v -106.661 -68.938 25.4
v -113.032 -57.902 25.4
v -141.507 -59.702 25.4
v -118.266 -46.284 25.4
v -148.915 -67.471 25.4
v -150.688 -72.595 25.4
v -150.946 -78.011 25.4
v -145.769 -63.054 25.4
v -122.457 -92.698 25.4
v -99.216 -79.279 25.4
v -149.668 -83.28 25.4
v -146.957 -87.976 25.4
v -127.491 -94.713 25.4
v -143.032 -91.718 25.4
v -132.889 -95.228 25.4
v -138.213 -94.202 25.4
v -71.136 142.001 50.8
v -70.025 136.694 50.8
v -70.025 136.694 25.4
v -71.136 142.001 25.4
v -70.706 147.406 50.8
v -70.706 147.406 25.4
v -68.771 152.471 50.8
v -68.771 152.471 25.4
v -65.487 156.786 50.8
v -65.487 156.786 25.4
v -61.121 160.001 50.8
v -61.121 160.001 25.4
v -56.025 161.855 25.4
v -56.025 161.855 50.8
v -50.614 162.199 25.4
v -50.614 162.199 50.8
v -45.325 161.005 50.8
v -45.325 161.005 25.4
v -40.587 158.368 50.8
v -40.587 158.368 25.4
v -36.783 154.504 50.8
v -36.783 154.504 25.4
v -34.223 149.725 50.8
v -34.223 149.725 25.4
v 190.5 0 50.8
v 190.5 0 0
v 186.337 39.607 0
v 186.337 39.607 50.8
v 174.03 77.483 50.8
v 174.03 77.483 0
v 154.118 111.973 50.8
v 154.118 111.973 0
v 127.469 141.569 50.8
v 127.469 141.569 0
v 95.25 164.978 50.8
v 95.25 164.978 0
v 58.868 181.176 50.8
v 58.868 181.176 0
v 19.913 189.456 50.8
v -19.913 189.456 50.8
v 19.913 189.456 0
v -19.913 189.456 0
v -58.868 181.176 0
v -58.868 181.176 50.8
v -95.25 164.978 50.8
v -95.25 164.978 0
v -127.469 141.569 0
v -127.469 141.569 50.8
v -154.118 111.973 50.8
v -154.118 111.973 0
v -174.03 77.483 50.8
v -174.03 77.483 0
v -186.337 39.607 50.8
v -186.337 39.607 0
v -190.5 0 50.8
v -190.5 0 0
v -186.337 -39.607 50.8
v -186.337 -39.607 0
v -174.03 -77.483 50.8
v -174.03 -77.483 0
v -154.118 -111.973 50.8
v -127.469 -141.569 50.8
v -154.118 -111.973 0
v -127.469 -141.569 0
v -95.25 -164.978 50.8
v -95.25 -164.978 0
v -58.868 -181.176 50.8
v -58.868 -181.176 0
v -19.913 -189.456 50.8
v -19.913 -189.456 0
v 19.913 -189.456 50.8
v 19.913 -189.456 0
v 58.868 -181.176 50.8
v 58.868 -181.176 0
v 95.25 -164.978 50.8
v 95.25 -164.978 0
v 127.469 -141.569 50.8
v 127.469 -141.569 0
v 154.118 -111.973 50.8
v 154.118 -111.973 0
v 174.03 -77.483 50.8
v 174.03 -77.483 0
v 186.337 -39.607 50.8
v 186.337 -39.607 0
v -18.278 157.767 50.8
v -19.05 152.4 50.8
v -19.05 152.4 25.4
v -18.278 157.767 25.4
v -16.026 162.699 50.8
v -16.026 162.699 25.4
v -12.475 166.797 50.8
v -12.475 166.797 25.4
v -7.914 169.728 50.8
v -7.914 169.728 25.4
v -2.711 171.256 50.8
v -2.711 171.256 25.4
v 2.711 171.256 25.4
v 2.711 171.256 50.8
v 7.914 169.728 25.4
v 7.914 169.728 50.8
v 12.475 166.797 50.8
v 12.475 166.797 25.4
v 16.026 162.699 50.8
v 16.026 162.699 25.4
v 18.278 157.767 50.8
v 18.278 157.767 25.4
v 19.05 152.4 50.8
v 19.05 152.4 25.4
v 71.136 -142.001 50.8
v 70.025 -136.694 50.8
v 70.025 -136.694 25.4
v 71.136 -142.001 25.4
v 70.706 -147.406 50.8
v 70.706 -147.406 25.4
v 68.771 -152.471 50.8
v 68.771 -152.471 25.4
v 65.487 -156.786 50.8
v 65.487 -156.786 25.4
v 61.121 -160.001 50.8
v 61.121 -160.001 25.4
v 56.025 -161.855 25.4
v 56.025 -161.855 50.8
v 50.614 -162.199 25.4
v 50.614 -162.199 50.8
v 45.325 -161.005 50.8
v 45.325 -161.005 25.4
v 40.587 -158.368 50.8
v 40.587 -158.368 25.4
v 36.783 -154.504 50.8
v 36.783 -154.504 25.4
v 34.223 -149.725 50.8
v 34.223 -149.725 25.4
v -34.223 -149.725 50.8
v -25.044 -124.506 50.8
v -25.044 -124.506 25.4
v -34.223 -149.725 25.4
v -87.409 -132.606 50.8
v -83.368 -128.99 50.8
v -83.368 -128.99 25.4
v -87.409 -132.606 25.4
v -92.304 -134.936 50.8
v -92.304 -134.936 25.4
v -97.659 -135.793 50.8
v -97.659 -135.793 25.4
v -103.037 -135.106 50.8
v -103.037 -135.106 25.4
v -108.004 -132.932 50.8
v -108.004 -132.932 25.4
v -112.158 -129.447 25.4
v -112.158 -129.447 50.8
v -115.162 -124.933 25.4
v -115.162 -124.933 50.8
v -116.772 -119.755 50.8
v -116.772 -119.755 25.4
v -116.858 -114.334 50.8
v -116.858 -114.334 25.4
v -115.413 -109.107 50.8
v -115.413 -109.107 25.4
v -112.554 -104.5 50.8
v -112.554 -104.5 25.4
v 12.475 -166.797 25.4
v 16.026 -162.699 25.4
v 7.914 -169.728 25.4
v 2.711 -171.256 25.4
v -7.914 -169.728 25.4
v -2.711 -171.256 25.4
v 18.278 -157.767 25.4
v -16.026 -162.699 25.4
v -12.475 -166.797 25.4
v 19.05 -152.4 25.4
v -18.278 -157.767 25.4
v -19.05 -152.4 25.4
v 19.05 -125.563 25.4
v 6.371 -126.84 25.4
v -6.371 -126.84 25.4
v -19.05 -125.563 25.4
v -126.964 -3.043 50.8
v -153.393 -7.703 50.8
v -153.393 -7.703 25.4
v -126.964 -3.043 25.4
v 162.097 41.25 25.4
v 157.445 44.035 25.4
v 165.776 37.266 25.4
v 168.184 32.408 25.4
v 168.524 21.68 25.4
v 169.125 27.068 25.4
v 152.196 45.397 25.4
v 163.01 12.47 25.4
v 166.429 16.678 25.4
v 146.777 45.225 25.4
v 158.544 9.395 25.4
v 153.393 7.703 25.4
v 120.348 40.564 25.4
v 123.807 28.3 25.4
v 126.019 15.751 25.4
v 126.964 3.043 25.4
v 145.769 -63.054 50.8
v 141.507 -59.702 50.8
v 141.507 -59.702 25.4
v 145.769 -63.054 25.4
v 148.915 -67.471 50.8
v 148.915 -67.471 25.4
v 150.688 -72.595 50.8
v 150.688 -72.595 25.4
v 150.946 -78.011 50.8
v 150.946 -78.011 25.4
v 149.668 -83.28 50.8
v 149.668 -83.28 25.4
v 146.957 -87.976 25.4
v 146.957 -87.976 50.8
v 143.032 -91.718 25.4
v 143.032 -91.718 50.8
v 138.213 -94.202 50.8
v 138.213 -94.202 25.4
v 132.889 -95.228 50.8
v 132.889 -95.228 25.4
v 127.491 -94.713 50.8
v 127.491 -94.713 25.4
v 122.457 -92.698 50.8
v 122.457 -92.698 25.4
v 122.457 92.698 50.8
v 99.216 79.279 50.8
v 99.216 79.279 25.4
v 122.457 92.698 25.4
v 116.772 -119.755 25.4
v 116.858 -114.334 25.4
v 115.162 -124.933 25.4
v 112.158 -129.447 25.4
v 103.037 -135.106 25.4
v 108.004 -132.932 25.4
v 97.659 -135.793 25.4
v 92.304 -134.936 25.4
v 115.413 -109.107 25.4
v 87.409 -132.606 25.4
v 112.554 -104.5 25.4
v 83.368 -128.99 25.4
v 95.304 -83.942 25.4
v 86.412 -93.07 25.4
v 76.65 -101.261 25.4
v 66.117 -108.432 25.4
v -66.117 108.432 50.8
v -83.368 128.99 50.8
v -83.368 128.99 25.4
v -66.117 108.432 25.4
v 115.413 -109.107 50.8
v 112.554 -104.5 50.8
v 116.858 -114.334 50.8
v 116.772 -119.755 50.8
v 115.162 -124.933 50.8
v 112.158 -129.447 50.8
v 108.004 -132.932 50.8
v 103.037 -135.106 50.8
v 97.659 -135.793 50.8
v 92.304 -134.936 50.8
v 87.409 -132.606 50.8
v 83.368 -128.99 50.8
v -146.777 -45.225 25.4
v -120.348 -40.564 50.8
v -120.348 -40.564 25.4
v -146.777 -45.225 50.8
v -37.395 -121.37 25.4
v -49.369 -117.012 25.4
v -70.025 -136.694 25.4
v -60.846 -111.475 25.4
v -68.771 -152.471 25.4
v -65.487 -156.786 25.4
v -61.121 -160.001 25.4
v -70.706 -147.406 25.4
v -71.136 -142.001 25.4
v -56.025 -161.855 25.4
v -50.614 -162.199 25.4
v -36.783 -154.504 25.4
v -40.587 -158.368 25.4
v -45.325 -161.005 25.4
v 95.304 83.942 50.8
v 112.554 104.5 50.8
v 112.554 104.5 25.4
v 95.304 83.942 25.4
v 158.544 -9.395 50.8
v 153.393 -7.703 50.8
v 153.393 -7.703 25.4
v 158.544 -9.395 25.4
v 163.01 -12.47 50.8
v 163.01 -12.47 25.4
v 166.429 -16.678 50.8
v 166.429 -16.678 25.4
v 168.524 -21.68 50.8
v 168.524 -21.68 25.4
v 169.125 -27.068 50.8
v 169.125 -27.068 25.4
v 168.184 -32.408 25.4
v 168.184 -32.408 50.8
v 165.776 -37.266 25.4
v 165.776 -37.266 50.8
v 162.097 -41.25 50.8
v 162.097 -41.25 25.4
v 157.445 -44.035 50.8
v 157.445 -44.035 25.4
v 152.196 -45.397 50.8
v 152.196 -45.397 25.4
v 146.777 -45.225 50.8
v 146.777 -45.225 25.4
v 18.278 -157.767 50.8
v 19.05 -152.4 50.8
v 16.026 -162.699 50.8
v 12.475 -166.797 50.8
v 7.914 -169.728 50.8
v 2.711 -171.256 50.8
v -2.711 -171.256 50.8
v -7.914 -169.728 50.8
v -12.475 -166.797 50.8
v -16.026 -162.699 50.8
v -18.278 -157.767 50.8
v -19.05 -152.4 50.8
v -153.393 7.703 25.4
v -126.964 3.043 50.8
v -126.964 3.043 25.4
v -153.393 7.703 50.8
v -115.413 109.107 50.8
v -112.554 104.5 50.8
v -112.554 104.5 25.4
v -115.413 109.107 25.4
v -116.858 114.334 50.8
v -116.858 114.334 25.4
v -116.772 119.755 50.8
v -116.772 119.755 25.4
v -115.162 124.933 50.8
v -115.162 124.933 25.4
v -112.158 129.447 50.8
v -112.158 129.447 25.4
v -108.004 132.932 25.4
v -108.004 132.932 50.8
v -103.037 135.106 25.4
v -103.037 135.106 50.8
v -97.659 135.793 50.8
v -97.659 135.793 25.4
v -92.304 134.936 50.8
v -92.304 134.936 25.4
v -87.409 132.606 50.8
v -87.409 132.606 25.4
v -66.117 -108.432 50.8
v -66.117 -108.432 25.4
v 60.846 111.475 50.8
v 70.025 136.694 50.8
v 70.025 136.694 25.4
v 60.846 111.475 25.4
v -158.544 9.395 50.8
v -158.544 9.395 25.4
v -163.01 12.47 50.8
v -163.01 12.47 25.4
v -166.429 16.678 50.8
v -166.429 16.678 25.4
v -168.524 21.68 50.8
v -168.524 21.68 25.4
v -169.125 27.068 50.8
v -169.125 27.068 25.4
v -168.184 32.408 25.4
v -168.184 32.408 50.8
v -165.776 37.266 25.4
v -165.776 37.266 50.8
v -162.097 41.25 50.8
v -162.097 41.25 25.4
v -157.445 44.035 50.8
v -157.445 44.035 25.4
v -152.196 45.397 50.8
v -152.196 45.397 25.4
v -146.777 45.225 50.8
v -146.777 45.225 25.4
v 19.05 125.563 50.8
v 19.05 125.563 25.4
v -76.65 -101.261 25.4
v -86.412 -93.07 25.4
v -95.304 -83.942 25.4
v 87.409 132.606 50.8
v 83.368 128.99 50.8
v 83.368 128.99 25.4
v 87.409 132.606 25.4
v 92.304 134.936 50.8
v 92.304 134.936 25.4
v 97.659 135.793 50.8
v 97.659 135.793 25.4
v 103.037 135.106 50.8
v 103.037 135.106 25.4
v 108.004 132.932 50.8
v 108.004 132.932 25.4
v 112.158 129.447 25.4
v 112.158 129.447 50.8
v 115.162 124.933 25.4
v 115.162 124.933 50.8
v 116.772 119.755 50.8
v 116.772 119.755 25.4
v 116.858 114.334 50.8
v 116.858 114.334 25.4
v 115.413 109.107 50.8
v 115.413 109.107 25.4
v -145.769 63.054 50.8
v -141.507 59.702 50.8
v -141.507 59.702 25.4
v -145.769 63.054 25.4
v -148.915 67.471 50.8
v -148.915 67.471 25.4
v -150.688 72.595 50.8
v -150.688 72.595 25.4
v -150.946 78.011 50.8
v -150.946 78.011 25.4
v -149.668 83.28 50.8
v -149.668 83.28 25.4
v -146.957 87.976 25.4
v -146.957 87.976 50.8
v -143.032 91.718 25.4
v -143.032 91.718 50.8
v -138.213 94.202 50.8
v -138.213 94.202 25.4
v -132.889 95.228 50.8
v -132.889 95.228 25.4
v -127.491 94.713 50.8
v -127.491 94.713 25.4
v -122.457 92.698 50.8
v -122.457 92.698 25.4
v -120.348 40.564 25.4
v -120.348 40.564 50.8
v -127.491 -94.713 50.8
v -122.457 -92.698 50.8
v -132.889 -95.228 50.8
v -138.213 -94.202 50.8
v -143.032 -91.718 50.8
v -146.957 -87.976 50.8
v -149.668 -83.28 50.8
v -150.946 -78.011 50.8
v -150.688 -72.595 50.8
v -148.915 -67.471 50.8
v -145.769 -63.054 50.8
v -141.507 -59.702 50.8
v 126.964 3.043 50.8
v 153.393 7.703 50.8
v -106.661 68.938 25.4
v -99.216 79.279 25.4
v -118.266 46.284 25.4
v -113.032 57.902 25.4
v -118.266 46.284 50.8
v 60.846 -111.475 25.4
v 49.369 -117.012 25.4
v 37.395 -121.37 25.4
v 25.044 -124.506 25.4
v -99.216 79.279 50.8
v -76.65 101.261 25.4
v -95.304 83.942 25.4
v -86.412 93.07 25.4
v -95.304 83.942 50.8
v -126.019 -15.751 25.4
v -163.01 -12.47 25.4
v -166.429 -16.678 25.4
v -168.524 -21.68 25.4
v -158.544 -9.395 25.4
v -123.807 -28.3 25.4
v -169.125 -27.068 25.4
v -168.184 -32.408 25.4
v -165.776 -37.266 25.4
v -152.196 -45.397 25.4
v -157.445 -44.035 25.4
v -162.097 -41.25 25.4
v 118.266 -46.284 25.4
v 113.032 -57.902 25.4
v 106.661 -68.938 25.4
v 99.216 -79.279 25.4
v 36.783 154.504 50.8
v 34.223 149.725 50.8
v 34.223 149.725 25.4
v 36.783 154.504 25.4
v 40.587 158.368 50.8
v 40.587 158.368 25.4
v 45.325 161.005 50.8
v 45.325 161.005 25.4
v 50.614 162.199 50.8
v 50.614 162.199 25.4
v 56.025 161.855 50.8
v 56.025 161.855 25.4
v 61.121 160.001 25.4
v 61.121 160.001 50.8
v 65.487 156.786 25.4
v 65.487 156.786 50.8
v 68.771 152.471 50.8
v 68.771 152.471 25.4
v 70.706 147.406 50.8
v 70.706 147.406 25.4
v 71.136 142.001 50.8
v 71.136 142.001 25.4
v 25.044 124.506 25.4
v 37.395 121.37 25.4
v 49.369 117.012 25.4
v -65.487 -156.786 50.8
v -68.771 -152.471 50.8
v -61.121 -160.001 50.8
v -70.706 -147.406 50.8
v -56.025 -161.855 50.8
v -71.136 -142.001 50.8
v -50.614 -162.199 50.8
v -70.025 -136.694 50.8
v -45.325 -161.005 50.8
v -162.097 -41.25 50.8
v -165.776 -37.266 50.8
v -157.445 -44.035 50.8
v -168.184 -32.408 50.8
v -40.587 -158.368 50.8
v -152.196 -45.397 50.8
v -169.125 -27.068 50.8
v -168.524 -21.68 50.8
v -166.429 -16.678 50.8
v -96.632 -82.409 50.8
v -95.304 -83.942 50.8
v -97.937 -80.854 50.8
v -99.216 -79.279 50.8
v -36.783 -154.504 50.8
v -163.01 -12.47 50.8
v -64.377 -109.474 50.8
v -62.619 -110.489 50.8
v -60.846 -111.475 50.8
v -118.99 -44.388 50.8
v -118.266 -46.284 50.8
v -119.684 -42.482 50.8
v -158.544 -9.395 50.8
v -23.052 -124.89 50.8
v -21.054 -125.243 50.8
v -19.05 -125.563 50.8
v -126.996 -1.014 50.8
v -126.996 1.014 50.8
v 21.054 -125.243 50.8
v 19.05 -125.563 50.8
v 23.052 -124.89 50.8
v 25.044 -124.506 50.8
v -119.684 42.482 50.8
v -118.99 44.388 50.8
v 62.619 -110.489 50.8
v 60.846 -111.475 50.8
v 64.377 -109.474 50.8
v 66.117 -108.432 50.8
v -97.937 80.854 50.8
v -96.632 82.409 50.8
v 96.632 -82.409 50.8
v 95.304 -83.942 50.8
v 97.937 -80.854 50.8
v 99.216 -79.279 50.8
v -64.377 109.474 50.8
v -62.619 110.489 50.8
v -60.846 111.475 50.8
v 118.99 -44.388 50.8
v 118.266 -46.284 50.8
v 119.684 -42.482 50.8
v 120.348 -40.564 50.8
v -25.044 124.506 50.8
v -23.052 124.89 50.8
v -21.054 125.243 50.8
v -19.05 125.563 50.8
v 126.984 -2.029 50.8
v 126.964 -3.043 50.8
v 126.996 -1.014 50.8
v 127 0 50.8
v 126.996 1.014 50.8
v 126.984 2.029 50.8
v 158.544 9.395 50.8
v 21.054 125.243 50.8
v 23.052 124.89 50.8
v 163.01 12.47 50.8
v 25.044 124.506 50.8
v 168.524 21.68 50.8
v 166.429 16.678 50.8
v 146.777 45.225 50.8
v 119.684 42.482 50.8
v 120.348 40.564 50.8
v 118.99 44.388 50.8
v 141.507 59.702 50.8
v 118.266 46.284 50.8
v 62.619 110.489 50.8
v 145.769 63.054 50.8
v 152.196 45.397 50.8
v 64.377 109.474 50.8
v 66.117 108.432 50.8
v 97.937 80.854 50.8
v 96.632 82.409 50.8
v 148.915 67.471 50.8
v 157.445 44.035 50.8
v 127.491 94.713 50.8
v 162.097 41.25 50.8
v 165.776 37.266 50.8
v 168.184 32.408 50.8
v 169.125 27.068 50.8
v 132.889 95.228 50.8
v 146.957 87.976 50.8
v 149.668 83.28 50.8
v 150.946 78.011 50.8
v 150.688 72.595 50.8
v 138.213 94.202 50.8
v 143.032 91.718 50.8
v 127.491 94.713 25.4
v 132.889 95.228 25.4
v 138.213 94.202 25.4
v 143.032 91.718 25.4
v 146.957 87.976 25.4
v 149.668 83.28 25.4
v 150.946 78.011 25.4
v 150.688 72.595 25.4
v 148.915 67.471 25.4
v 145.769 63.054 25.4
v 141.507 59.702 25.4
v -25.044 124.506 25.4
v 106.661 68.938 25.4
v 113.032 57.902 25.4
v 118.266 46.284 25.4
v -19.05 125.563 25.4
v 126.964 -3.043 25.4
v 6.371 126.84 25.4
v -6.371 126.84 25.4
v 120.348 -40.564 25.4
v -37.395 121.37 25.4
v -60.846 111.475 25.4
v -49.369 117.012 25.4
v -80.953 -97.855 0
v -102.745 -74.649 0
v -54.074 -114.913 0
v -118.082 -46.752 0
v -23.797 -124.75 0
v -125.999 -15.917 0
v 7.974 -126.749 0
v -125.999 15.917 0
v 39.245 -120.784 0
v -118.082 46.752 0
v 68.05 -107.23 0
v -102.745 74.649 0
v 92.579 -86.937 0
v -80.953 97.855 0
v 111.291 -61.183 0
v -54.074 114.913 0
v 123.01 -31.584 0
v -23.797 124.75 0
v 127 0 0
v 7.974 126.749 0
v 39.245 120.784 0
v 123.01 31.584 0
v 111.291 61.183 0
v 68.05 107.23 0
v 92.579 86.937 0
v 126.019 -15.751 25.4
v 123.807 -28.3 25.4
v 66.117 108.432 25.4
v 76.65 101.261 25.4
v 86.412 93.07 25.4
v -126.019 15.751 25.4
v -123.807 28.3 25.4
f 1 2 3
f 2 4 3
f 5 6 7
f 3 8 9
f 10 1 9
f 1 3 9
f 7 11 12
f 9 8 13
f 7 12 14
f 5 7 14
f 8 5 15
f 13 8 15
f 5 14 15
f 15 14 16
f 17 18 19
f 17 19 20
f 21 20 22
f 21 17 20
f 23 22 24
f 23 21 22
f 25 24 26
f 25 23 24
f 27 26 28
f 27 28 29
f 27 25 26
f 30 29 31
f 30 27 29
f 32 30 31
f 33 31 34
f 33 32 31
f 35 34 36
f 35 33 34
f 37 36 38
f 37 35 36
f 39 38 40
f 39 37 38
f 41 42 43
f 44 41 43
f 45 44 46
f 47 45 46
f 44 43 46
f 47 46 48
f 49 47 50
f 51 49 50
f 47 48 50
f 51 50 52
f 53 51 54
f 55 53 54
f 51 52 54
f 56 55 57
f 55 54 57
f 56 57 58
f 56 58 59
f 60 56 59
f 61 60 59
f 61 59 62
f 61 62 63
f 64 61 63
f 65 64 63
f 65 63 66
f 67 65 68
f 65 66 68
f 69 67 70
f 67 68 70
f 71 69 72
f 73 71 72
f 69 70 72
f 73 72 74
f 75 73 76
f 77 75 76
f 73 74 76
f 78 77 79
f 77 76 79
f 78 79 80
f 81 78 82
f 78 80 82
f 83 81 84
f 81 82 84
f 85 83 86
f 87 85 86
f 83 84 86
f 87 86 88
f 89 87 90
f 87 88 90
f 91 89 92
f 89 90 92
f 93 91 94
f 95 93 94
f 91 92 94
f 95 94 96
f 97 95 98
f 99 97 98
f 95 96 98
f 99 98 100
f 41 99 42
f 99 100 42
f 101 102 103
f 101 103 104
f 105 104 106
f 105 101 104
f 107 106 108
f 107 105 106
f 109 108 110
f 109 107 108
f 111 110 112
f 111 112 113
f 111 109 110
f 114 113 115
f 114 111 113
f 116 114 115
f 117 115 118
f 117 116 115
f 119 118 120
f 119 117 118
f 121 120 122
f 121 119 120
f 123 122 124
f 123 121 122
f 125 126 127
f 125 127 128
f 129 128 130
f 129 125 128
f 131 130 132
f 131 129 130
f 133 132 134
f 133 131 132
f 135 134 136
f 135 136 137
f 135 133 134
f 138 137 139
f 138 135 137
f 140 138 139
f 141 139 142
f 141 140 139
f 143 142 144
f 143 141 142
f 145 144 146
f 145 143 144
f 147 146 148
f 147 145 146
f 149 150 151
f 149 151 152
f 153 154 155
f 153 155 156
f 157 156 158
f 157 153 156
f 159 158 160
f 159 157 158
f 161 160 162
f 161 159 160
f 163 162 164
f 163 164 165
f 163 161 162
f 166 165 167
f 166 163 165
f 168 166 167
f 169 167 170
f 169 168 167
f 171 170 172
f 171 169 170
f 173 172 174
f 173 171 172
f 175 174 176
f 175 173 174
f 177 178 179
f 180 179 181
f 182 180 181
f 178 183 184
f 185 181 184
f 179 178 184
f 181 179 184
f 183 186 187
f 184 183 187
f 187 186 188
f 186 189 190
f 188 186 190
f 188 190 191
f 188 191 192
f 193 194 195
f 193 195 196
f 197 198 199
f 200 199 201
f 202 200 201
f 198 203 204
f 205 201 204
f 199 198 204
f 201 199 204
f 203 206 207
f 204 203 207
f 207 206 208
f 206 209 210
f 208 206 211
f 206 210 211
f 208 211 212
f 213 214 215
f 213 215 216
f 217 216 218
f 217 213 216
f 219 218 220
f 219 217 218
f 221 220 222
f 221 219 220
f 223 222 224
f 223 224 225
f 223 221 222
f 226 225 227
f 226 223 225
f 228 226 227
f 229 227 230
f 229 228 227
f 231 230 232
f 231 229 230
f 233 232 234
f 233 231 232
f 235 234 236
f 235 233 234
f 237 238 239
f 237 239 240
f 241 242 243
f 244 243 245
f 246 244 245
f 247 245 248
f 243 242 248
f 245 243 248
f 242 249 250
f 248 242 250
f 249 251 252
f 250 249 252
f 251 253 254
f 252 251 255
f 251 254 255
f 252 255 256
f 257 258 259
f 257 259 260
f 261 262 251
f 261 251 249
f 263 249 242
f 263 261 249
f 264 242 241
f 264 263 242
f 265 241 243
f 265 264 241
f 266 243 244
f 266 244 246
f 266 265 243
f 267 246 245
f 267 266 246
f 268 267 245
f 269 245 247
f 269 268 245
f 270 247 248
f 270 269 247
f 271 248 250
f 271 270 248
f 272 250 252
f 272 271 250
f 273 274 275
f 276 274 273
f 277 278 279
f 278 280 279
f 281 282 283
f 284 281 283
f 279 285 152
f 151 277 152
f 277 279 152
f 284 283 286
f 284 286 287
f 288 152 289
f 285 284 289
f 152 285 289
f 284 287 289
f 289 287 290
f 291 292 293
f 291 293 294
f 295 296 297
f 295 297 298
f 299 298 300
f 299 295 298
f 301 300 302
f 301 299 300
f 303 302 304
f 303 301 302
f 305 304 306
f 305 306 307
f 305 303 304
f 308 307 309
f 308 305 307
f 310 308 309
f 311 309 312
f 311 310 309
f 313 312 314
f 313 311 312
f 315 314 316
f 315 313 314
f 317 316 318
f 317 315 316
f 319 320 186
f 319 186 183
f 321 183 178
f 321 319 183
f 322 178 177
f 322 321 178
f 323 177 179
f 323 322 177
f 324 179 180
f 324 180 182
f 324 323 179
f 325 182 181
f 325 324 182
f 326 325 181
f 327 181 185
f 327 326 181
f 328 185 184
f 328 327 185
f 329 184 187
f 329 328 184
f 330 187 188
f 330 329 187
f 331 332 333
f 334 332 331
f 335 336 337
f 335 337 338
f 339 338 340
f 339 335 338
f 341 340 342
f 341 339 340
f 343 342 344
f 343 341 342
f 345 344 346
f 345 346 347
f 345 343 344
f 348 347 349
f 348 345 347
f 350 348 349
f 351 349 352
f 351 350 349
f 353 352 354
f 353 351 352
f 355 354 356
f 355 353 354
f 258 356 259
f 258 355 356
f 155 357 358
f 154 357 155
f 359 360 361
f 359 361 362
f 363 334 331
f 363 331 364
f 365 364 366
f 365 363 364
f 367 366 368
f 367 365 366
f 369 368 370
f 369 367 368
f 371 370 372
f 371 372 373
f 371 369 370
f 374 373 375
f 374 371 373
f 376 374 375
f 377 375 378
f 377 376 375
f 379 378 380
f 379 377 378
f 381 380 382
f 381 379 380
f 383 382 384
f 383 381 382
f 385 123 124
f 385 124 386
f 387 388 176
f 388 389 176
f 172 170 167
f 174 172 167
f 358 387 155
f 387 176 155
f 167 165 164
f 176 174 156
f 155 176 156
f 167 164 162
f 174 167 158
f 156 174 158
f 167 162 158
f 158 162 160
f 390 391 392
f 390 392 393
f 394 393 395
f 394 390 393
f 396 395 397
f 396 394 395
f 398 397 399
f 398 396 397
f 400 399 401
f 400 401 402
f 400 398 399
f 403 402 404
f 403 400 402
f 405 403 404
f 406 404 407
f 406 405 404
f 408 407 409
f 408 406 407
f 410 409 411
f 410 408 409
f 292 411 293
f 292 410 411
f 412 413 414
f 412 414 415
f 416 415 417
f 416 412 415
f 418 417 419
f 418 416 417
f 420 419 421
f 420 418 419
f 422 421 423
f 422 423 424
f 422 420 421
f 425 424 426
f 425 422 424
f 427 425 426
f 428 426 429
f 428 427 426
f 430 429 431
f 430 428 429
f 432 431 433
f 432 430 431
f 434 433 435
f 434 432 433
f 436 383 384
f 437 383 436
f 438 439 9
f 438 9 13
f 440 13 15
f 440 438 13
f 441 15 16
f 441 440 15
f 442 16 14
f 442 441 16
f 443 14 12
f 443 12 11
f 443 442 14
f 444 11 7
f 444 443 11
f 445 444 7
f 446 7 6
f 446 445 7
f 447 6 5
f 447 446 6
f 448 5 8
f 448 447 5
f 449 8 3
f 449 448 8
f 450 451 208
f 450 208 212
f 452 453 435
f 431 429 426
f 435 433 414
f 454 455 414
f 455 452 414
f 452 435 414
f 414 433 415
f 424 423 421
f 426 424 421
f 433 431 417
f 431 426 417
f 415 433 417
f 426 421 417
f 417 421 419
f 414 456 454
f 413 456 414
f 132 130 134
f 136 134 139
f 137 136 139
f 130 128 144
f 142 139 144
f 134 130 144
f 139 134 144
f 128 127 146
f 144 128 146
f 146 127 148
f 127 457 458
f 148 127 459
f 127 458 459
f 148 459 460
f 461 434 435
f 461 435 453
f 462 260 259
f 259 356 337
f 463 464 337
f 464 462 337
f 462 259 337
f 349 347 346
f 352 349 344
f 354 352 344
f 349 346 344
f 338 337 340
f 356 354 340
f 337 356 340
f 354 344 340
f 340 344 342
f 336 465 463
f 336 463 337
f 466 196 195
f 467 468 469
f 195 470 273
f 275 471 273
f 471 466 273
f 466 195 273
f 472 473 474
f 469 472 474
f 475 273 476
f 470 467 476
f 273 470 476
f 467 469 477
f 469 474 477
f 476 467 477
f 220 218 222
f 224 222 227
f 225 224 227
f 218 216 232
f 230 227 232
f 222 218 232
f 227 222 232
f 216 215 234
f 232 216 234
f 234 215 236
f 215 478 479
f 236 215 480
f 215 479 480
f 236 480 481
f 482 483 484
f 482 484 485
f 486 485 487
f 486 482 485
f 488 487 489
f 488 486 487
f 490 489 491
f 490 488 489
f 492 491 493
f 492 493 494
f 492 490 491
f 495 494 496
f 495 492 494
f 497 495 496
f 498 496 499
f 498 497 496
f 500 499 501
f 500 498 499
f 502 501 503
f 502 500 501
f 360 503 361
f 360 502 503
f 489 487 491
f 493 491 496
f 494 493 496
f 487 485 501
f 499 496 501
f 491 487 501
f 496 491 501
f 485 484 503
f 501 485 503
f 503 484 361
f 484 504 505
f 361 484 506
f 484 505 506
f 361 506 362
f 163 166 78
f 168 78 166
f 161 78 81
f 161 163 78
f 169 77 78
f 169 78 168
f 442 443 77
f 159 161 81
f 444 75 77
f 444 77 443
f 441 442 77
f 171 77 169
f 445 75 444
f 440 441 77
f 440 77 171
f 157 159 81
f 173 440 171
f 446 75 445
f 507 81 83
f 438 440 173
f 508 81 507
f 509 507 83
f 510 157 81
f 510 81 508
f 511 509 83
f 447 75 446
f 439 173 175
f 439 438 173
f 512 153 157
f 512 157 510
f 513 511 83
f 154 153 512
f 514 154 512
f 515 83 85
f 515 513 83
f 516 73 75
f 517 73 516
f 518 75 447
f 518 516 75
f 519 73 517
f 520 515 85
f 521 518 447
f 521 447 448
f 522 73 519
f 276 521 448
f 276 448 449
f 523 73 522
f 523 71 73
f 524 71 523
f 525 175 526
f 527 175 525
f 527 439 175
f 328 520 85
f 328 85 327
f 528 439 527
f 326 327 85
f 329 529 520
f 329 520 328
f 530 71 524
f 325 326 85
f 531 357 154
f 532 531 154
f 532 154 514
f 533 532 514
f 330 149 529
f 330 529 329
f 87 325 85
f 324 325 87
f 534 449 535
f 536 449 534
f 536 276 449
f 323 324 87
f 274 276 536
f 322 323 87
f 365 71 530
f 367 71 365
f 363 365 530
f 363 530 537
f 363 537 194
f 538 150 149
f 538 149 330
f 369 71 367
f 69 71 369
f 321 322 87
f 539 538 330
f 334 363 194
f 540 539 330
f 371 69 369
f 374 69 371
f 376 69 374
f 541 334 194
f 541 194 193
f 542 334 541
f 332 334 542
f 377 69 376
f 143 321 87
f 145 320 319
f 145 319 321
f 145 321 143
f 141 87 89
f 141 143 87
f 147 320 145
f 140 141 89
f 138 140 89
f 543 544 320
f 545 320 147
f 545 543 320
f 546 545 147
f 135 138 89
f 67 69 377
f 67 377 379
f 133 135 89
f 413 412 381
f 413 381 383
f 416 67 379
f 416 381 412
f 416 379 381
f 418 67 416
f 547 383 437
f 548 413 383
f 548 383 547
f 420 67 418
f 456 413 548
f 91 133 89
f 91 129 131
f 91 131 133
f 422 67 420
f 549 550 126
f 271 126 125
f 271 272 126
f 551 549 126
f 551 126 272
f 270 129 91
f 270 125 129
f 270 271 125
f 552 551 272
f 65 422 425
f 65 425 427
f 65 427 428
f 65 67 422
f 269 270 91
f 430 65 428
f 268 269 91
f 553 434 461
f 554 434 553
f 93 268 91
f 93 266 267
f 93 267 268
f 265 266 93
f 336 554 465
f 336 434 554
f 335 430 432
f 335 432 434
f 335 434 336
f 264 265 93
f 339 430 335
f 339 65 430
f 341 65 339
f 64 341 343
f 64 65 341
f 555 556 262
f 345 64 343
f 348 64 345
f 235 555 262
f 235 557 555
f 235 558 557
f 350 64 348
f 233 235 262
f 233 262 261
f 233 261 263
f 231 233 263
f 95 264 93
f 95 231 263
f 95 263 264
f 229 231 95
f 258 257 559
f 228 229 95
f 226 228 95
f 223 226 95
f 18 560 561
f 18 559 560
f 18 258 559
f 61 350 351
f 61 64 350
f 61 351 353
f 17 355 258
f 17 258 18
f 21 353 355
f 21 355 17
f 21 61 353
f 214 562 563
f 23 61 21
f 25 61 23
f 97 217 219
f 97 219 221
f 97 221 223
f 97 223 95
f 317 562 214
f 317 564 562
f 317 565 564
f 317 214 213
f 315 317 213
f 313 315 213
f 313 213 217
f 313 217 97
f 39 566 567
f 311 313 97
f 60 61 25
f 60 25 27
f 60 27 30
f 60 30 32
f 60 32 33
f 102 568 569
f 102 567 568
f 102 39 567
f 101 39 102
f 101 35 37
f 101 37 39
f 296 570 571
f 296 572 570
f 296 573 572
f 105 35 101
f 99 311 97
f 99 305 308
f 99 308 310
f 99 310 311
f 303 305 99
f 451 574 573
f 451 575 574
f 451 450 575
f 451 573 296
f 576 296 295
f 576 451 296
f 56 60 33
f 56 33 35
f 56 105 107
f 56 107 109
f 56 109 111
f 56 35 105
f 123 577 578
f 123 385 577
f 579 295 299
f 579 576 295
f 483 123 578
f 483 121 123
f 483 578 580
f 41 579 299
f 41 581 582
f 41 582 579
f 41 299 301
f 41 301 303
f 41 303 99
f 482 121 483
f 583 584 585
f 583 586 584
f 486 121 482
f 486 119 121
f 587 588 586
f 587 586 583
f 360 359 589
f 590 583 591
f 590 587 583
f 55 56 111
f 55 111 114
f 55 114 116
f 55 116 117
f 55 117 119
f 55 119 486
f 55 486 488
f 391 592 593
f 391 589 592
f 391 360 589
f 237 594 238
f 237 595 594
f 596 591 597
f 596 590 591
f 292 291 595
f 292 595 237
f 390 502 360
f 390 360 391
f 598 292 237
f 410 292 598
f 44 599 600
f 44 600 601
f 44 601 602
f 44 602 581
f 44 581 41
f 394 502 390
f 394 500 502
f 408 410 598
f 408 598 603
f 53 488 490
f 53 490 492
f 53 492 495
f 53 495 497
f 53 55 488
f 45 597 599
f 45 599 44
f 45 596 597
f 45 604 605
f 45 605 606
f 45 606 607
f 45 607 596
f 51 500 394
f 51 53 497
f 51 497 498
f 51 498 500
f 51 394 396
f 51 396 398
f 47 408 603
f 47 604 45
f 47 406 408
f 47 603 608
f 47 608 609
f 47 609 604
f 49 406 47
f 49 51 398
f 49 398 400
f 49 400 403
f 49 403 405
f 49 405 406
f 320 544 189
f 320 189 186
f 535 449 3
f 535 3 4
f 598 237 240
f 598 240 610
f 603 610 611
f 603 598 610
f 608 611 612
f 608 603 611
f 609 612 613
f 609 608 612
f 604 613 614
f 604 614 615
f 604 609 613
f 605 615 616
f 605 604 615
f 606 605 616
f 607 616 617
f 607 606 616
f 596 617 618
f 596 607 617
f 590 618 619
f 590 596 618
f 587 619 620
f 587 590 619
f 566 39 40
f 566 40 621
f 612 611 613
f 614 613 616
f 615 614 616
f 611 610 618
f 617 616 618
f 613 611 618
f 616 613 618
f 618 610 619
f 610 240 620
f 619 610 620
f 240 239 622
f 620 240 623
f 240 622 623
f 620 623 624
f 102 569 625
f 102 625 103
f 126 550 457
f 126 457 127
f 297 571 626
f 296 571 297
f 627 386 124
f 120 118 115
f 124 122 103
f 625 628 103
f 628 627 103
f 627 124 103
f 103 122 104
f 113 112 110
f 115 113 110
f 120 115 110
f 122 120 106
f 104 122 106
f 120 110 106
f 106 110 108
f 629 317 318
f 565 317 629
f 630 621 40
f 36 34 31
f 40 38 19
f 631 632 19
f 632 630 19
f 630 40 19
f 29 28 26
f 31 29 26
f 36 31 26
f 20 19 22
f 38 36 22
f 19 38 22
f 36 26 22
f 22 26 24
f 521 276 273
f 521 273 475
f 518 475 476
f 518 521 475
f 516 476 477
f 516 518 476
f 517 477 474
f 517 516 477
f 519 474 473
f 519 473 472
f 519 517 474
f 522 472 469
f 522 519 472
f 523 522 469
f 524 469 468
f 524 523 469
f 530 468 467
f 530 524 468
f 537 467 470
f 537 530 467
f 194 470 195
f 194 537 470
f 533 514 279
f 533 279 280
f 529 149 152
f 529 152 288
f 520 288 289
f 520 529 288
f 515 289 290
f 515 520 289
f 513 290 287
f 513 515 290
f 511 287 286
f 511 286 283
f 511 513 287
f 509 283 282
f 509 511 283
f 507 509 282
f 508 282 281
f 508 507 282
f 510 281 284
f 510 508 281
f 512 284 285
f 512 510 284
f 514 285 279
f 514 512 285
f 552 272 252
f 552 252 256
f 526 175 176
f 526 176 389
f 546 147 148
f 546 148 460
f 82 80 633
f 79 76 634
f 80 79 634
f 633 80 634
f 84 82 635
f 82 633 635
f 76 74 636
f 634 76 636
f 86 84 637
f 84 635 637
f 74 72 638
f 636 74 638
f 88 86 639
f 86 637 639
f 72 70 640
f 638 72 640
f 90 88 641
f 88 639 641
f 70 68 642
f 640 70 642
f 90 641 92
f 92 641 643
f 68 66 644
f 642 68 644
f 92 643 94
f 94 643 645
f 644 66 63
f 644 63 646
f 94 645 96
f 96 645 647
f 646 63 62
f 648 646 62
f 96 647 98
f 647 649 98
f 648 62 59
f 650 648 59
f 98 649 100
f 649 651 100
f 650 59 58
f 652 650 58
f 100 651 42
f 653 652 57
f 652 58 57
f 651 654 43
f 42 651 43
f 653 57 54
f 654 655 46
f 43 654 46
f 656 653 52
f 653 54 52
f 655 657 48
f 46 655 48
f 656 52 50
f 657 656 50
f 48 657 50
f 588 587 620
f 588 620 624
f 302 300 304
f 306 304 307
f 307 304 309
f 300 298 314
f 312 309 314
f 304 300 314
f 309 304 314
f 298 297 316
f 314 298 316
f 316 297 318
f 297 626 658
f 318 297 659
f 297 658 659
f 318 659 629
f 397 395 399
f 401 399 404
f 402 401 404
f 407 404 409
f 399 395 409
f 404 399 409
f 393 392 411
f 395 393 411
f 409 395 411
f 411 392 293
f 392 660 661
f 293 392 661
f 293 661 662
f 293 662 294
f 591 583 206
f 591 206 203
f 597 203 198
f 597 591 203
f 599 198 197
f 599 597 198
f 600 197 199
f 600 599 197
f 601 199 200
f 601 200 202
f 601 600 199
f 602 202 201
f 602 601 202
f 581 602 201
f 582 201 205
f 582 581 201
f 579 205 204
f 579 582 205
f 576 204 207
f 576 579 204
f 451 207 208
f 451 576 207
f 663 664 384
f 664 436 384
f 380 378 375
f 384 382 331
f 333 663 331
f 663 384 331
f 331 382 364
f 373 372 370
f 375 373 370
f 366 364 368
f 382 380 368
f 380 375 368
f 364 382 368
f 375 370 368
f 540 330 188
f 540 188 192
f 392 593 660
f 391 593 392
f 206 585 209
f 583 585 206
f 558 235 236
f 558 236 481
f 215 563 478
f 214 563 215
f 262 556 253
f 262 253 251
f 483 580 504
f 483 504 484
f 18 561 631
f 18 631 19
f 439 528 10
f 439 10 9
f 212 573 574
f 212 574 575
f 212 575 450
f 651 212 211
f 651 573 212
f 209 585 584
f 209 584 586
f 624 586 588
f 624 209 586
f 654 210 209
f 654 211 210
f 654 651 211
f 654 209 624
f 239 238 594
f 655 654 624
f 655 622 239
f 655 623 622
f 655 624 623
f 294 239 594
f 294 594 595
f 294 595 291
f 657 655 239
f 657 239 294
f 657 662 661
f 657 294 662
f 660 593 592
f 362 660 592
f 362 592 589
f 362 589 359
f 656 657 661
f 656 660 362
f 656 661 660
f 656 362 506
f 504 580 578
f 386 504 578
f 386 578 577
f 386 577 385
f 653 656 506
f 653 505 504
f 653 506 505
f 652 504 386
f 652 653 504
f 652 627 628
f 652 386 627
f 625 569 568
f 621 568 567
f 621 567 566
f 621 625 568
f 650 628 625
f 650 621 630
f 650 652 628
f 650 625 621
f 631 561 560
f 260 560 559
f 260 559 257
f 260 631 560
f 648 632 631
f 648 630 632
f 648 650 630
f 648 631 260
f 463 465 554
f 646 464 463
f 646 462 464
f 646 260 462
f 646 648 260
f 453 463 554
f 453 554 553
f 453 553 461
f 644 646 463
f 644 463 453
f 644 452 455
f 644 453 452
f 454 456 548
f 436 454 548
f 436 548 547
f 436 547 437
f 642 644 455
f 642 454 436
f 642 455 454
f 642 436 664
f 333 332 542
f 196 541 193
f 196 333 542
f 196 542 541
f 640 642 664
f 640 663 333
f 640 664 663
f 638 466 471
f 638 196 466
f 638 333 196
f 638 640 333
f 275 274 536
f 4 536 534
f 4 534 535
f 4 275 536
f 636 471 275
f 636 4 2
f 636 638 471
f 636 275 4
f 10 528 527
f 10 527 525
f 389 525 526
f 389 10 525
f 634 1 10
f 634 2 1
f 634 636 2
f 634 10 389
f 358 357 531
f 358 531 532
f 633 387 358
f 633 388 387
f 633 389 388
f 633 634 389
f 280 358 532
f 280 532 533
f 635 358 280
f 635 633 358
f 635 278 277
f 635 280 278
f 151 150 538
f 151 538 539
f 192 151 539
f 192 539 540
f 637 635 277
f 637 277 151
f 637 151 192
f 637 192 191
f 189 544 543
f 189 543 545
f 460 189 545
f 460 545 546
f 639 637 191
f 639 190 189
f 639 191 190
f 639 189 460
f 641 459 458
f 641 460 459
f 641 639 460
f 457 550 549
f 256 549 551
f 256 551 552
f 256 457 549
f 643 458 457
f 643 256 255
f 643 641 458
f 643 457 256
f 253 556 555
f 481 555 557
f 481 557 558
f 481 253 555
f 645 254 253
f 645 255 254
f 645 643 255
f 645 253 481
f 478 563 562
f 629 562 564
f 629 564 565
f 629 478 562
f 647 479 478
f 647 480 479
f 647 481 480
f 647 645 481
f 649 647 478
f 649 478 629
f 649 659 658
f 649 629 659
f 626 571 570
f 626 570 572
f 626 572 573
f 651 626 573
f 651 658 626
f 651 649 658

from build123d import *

# Parameters (mm, degrees)
SKETCH1_R           = 190.5
SKETCH1_R_2         = 127
BOSS_EXTRUDE1_DEPTH = 50.8
CUT_EXTRUDE1_DEPTH  = 25.4
CIRPATTERN1_COUNT   = 10
CIRPATTERN1_ANGLE   = 180


with BuildPart() as part:
    # Sketch1 → Boss-Extrude1 (new body)
    with BuildSketch(Plane.XY):
        Circle(SKETCH1_R)
        Circle(SKETCH1_R_2, mode=Mode.SUBTRACT)
    extrude(amount=BOSS_EXTRUDE1_DEPTH)

    # Sketch2 → Cut-Extrude1 (cut)
    with BuildSketch(Plane.XY.offset(50.8)):
        with BuildLine():
            Line((19.05, 152.4), (19.05, -152.4))
            ThreePointArc((19.05, -152.4), (0, -171.45), (-19.05, -152.4))
            Line((-19.05, -152.4), (-19.05, 152.4))
            ThreePointArc((-19.05, 152.4), (0, 171.45), (19.05, 152.4))
        make_face()
    cut_extrude1 = extrude(amount=-CUT_EXTRUDE1_DEPTH, mode=Mode.SUBTRACT)

    # CirPattern1: Cut-Extrude1 ×10 about axis
    cirpattern1_axis = Axis((0, 0, 0), (0, 0, 1))
    for i in range(1, CIRPATTERN1_COUNT):
        add(cut_extrude1.rotate(cirpattern1_axis, i * CIRPATTERN1_ANGLE / (CIRPATTERN1_COUNT - 1)), mode=Mode.SUBTRACT)


solid = part.part
